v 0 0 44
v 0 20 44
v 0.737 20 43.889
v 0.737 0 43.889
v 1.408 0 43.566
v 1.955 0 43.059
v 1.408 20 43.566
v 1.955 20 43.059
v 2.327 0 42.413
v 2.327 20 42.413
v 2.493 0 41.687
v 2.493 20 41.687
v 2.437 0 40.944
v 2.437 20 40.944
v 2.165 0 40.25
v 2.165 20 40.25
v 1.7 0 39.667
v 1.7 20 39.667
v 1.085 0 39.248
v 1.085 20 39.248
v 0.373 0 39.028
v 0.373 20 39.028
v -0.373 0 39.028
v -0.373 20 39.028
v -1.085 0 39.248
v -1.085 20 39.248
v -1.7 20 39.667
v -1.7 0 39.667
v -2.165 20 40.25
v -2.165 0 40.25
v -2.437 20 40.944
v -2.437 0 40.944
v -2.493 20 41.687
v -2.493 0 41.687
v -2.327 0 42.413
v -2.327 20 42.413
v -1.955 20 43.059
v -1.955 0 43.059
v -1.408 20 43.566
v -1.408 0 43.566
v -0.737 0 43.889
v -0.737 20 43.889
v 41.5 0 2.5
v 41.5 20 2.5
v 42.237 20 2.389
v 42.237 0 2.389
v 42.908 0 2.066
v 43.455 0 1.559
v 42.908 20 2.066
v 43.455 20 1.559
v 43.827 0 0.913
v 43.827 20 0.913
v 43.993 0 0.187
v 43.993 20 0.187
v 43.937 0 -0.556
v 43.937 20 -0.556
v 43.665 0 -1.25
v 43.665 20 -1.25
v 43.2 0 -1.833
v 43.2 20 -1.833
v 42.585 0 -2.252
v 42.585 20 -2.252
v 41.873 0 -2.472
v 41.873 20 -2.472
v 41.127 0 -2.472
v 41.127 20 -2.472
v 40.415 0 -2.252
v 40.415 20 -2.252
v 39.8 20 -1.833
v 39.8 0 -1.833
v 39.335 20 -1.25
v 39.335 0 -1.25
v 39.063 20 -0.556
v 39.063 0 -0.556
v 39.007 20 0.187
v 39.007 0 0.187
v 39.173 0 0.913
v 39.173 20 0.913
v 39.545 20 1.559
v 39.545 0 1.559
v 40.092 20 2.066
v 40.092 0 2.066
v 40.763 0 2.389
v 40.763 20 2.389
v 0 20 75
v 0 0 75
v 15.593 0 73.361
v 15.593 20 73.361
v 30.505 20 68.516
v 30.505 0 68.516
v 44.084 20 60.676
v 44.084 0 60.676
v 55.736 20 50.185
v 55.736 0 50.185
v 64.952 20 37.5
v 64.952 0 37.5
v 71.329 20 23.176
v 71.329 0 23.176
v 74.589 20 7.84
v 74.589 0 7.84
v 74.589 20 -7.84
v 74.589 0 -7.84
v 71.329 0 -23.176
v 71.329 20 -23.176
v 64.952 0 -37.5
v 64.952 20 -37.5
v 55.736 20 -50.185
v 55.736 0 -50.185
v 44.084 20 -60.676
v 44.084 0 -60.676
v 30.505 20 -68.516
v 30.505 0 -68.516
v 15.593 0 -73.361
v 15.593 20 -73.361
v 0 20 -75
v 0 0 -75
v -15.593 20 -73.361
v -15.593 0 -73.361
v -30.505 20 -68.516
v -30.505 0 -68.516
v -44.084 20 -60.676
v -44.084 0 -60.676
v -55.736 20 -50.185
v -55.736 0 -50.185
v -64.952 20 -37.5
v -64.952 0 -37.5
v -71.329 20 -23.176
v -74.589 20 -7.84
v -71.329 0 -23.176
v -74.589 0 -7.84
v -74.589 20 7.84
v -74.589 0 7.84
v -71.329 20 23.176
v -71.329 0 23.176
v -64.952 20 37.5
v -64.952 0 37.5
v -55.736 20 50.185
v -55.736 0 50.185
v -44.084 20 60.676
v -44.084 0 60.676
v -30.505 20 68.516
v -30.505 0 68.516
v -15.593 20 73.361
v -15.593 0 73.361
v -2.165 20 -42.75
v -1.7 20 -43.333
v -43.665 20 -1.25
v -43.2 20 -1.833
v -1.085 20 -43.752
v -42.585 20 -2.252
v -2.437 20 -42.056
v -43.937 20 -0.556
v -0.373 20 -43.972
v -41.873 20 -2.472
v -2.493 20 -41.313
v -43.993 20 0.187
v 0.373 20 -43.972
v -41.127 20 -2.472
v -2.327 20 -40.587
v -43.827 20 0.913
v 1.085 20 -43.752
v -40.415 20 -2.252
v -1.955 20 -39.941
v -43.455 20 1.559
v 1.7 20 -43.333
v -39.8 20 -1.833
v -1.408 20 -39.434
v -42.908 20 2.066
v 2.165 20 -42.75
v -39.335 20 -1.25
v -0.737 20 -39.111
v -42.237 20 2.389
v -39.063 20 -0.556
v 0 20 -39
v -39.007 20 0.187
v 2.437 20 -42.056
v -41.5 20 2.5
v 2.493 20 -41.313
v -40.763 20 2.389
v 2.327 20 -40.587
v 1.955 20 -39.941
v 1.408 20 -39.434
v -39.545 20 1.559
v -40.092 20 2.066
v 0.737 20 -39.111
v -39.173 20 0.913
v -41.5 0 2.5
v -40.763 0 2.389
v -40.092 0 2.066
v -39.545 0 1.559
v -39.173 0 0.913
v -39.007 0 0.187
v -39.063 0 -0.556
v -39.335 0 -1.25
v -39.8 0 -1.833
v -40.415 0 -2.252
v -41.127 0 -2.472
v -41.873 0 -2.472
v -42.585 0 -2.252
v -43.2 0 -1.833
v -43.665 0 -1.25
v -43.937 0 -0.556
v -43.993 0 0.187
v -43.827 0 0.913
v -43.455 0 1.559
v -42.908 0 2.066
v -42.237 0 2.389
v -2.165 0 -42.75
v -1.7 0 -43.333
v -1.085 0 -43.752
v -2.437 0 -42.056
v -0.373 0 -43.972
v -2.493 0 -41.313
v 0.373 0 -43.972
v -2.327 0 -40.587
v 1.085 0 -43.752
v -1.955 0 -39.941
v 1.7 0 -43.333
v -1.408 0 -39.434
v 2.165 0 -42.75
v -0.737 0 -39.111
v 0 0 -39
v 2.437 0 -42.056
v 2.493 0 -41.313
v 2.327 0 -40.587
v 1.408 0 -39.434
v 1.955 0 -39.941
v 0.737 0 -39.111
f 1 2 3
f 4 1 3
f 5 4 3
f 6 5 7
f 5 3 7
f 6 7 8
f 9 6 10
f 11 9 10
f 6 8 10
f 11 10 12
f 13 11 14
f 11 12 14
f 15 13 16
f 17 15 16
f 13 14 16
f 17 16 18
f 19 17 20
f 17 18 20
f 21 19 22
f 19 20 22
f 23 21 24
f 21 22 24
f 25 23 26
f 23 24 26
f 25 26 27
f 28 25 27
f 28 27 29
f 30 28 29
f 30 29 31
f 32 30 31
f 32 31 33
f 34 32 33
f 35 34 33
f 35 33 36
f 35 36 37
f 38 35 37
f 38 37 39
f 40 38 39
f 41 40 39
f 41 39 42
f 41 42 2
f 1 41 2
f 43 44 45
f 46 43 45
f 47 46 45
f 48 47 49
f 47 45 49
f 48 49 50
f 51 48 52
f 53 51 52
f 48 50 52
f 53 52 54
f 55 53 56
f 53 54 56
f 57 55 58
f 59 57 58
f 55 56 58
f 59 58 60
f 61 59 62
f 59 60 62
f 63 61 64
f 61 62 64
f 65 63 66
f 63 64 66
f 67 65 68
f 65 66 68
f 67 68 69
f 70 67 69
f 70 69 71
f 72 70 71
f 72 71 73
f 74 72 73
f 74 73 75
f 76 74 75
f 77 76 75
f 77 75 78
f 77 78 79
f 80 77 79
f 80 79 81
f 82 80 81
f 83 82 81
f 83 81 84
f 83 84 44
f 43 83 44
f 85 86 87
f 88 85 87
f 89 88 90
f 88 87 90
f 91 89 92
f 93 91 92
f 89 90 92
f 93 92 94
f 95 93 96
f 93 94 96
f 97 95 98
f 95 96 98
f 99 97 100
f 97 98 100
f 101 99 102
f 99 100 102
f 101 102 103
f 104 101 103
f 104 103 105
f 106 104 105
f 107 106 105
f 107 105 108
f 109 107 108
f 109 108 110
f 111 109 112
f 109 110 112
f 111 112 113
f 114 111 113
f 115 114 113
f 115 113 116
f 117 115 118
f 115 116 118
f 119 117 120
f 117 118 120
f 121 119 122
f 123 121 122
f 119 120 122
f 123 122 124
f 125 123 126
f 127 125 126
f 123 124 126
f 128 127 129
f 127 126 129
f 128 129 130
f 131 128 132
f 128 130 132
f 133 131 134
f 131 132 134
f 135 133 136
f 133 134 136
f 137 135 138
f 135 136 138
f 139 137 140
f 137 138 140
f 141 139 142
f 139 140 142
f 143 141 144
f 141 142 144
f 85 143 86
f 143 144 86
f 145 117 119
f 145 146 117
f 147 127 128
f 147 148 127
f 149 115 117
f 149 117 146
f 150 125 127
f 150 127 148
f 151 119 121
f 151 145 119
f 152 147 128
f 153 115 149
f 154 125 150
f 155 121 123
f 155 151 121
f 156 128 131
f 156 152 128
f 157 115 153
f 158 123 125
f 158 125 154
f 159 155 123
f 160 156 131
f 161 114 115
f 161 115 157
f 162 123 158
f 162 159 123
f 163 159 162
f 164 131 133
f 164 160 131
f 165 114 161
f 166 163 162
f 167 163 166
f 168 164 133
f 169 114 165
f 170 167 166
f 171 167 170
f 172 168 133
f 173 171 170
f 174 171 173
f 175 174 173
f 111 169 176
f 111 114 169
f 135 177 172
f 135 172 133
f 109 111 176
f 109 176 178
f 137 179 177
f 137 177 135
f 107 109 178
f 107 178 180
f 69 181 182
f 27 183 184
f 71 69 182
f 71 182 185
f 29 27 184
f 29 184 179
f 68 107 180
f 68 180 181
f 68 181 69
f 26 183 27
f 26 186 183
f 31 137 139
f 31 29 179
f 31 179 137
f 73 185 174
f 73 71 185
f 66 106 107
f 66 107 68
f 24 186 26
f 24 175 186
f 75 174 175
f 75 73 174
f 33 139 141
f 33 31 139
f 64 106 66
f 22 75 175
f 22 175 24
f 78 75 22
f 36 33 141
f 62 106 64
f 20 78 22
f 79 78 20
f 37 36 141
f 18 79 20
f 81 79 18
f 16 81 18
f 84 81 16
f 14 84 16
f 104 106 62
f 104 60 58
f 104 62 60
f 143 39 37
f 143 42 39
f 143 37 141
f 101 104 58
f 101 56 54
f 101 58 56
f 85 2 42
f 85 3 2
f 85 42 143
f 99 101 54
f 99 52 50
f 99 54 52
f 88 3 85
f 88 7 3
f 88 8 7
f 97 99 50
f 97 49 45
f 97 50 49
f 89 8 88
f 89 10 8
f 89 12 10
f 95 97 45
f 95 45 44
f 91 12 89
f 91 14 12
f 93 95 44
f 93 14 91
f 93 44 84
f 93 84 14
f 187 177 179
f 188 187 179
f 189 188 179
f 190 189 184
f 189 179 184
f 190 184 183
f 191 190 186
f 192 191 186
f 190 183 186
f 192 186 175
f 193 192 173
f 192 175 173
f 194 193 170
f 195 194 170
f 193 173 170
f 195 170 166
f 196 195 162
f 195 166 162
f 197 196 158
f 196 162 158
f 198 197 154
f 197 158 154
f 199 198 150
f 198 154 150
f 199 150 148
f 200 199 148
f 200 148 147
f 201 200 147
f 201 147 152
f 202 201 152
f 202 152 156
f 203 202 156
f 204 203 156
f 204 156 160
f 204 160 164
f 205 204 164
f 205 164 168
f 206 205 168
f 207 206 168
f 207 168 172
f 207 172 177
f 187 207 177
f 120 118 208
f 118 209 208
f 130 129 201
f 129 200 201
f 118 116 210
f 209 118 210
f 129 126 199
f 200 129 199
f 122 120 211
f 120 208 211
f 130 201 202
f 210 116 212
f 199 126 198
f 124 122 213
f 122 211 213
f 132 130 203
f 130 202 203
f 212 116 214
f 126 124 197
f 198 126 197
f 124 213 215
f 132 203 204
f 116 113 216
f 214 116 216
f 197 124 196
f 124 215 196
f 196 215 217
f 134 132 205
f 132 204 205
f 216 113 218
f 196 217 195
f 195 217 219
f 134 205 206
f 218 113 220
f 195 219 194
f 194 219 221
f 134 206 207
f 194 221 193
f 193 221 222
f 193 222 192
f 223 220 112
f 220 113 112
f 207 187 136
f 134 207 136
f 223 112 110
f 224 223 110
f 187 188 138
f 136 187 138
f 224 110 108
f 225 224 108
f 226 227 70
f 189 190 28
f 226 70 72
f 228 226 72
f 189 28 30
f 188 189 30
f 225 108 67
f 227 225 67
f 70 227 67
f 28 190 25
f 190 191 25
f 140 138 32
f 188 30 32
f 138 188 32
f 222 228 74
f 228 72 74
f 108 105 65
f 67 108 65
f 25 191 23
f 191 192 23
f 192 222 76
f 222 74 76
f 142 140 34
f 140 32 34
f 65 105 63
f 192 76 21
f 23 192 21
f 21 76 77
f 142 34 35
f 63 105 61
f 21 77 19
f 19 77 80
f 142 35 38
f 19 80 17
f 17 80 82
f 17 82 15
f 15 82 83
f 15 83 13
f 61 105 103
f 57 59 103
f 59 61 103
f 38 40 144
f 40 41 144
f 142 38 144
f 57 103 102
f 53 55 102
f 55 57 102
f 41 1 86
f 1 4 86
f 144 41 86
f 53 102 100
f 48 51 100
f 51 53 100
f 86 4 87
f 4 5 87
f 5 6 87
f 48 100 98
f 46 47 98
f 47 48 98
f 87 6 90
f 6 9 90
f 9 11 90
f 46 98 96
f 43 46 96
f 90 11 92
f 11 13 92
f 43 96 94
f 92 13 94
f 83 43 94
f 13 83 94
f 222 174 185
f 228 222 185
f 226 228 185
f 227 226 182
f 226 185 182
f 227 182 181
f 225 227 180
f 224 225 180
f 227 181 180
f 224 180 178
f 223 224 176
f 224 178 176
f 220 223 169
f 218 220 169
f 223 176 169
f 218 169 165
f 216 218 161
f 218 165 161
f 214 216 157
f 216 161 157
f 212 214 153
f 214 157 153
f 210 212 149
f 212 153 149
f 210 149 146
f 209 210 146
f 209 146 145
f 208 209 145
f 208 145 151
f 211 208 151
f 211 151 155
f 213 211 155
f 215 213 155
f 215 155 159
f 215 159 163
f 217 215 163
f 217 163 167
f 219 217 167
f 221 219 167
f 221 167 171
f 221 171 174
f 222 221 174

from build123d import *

# Parameters (mm, degrees)
SKETCH1_R           = 75
BOSS_EXTRUDE1_DEPTH = 20
CUT_EXTRUDE1_REACH  = 109.935
SKETCH2_R           = 2.5


with BuildPart() as part:
    # Sketch1 → Boss-Extrude1 (new body)
    with BuildSketch(Plane(origin=(0, 0, 0), x_dir=(1, 0, 0), z_dir=(0, 1, 0))):
        with Locations(Location((0, 0, 0), (0, 0, 270))):
            Circle(SKETCH1_R)
    extrude(amount=BOSS_EXTRUDE1_DEPTH)

    # Sketch2 → Cut-Extrude1 (cut, up to next)
    with BuildSketch(Plane(origin=(0, 20, 0), x_dir=(1, 0, 0), z_dir=(0, 1, 0)), mode=Mode.PRIVATE) as cut_extrude1_sk1:
        with Locations(Location((0, 41.5, 0), (0, 0, 270))):
            Circle(SKETCH2_R)
    cut_extrude1_tool1 = extrude(cut_extrude1_sk1.sketch, amount=-CUT_EXTRUDE1_REACH, mode=Mode.PRIVATE) & part.part
    # Sketch2 → Cut-Extrude1 (cut, up to next)
    with BuildSketch(Plane(origin=(0, 20, 0), x_dir=(1, 0, 0), z_dir=(0, 1, 0)), mode=Mode.PRIVATE) as cut_extrude1_sk2:
        with Locations(Location((41.5, 0, 0), (0, 0, 270))):
            Circle(SKETCH2_R)
    cut_extrude1_tool2 = extrude(cut_extrude1_sk2.sketch, amount=-CUT_EXTRUDE1_REACH, mode=Mode.PRIVATE) & part.part
    # Sketch2 → Cut-Extrude1 (cut, up to next)
    with BuildSketch(Plane(origin=(0, 20, 0), x_dir=(1, 0, 0), z_dir=(0, 1, 0)), mode=Mode.PRIVATE) as cut_extrude1_sk3:
        with Locations(Location((0, -41.5, 0), (0, 0, 270))):
            Circle(SKETCH2_R)
    cut_extrude1_tool3 = extrude(cut_extrude1_sk3.sketch, amount=-CUT_EXTRUDE1_REACH, mode=Mode.PRIVATE) & part.part
    # Sketch2 → Cut-Extrude1 (cut, up to next)
    with BuildSketch(Plane(origin=(0, 20, 0), x_dir=(1, 0, 0), z_dir=(0, 1, 0)), mode=Mode.PRIVATE) as cut_extrude1_sk4:
        with Locations(Location((-41.5, 0, 0), (0, 0, 270))):
            Circle(SKETCH2_R)
    cut_extrude1_tool4 = extrude(cut_extrude1_sk4.sketch, amount=-CUT_EXTRUDE1_REACH, mode=Mode.PRIVATE) & part.part
    add(cut_extrude1_tool1.solids().sort_by_distance((0, 20, -41.5))[0], mode=Mode.SUBTRACT)
    add(cut_extrude1_tool2.solids().sort_by_distance((41.5, 20, 0))[0], mode=Mode.SUBTRACT)
    add(cut_extrude1_tool3.solids().sort_by_distance((0, 20, 41.5))[0], mode=Mode.SUBTRACT)
    add(cut_extrude1_tool4.solids().sort_by_distance((-41.5, 20, 0))[0], mode=Mode.SUBTRACT)


solid = part.part
